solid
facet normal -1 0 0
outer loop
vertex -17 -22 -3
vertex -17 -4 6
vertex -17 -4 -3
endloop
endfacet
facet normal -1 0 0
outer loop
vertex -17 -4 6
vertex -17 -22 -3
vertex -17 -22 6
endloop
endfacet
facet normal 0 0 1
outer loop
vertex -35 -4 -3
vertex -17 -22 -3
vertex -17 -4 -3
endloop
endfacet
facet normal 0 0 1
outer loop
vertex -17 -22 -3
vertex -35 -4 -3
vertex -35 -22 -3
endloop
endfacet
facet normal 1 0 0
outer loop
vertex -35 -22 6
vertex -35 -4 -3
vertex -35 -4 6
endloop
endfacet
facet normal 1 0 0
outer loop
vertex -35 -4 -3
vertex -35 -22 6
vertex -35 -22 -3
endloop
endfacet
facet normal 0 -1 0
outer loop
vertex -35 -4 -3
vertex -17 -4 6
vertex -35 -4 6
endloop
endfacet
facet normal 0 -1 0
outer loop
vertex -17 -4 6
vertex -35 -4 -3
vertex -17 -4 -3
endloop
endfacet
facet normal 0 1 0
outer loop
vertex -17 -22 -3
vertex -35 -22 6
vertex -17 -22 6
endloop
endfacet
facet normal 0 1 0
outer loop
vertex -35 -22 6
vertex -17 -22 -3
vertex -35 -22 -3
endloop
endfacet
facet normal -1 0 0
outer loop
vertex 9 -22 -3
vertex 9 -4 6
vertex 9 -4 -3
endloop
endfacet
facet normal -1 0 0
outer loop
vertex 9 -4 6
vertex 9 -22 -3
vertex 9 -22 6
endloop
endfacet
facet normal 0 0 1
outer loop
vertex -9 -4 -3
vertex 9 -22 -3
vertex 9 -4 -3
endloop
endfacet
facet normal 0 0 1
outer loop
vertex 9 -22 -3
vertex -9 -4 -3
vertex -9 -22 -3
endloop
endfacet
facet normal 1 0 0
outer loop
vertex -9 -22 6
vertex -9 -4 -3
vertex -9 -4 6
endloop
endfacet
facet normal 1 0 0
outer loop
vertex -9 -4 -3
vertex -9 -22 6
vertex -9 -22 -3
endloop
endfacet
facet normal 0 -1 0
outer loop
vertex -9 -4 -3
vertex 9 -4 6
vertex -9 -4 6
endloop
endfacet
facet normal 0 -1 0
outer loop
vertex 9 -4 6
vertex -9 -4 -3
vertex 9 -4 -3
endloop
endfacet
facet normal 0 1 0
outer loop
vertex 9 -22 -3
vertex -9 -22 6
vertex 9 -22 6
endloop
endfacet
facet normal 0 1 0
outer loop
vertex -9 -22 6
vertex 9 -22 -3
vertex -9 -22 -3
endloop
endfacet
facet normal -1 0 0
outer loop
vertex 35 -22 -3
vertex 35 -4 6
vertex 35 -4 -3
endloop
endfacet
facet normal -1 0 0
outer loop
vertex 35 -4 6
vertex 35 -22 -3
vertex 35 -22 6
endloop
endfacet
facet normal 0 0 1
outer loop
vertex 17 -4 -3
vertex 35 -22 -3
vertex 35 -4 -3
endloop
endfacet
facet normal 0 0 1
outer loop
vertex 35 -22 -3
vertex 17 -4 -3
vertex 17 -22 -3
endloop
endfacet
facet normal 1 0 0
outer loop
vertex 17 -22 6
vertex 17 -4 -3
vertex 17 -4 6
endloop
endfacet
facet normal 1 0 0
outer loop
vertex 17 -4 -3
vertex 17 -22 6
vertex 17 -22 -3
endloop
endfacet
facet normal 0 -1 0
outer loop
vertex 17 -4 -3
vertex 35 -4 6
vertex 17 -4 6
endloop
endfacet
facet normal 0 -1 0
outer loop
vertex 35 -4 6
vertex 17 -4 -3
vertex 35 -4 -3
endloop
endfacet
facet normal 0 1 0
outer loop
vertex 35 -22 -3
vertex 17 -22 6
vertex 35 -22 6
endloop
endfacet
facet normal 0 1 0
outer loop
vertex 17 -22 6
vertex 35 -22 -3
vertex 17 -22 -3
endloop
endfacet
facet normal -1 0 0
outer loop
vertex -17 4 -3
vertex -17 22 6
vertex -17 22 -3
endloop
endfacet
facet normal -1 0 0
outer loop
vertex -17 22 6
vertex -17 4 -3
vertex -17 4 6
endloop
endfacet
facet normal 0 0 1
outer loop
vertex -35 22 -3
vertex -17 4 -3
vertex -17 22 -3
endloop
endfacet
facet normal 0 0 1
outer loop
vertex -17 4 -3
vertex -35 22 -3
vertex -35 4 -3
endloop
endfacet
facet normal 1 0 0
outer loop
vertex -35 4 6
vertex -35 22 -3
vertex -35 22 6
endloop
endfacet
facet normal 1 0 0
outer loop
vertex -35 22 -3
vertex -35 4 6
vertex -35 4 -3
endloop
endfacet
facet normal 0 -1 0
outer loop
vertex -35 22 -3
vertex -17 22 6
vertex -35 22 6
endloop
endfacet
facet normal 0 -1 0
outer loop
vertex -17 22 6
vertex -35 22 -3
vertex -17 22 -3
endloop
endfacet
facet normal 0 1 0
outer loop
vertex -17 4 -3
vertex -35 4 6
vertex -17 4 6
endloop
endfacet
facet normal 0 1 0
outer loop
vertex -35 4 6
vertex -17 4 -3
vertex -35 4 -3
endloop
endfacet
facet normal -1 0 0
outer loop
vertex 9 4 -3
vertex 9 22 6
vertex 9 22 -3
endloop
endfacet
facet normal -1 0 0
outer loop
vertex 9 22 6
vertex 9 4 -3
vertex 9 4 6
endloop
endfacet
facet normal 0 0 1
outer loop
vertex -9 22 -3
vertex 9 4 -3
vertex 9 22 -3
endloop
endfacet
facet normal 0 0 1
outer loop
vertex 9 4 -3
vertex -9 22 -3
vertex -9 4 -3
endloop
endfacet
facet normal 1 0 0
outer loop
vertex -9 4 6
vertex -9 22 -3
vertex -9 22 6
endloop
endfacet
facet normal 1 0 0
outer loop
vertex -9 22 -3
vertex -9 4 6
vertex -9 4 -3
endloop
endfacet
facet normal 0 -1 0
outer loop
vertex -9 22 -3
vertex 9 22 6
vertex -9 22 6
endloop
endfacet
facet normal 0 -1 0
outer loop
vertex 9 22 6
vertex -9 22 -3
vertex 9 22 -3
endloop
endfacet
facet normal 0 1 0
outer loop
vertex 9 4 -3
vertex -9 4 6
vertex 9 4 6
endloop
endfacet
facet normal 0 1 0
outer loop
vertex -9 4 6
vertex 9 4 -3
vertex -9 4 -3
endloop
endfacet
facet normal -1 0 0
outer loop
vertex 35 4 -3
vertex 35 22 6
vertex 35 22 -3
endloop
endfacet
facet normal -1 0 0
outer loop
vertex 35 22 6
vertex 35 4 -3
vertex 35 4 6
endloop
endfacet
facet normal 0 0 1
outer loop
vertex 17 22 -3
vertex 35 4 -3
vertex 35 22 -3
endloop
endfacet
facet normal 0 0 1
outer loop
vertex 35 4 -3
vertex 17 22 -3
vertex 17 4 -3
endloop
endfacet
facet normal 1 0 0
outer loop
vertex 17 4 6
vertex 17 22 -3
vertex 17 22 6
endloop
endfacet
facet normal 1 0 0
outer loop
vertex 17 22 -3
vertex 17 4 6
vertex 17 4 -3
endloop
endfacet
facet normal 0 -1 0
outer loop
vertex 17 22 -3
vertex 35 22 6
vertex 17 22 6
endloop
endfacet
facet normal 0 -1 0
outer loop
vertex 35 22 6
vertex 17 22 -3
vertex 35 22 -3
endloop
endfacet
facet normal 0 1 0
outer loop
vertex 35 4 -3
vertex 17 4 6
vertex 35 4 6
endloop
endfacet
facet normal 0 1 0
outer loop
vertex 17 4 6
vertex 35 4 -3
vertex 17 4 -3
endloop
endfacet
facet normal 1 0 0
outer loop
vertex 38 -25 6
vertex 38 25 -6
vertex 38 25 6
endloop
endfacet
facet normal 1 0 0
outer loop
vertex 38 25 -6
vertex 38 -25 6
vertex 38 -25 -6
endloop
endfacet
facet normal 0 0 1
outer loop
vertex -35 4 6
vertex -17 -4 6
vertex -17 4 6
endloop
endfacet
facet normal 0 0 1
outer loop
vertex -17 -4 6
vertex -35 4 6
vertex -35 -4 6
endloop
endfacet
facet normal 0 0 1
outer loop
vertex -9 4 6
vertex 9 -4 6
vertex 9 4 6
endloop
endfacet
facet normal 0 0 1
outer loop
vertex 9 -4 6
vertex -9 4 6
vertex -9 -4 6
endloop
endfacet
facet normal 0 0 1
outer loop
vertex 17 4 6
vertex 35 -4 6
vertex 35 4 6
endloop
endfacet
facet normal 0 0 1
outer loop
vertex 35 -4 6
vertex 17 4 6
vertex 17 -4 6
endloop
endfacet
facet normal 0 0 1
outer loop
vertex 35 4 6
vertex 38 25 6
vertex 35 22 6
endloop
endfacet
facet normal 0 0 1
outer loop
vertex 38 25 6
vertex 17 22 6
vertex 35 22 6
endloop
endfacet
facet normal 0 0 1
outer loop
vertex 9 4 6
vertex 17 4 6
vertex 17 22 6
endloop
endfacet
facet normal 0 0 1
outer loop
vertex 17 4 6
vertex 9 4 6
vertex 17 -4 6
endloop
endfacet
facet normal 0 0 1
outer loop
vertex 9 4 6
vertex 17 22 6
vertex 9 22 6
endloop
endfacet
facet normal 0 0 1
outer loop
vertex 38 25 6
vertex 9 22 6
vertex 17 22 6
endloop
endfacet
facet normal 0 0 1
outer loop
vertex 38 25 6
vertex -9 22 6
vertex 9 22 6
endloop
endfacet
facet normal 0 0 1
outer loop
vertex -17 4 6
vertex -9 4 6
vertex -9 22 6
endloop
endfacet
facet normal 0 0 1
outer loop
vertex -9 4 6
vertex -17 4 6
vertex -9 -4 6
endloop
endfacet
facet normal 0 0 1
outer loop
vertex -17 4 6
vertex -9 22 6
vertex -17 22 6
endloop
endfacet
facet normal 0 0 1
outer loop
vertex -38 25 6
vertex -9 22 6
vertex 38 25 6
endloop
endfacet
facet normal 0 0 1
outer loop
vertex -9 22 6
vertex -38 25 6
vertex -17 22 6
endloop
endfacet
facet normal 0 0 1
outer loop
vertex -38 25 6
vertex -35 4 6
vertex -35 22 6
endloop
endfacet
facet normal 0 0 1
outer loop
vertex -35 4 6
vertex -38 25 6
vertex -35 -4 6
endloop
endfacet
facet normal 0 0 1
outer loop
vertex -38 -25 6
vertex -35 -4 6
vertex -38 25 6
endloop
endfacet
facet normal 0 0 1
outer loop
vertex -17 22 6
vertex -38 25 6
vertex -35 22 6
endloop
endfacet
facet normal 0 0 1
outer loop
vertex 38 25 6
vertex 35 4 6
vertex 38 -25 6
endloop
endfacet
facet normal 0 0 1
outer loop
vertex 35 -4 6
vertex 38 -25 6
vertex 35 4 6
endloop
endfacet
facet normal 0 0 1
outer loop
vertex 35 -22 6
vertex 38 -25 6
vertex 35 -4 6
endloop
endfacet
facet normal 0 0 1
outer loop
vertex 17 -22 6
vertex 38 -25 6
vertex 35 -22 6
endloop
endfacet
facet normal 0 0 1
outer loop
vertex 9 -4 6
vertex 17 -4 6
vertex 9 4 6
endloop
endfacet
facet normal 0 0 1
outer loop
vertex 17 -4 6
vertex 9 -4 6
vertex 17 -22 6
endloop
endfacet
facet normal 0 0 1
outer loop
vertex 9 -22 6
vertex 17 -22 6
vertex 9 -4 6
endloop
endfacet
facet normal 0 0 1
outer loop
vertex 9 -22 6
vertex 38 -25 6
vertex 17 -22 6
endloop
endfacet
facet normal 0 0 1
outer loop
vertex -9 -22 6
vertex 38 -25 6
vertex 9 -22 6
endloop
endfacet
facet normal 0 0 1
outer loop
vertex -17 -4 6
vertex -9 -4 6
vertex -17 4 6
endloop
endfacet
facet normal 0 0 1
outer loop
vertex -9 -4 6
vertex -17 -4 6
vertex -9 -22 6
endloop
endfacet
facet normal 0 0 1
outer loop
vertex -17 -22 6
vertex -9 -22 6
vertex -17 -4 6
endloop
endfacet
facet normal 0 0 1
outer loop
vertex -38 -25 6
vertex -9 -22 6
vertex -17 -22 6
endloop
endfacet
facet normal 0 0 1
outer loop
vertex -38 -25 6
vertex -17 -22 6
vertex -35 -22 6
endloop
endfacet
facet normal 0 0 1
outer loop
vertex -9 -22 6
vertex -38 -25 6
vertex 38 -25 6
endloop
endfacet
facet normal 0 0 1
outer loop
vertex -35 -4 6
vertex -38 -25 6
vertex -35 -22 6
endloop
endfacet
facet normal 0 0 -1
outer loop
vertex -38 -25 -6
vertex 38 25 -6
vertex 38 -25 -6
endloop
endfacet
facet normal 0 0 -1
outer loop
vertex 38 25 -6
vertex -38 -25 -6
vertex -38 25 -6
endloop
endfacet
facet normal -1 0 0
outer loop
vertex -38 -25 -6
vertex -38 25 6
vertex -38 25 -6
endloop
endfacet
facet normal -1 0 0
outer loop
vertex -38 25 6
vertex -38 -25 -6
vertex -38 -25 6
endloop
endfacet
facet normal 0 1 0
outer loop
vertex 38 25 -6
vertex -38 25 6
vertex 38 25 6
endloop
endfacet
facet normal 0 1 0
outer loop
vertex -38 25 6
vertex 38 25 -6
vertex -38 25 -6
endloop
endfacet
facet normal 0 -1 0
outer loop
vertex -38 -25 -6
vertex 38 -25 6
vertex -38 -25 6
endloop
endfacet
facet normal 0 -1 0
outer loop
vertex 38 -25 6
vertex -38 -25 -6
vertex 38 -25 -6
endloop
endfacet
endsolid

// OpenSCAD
$fn = 32;

// ----------------------------------------------------------------------
// Pocket plate 76 x 50 x 12
// 2 x 3 pockets 18 mm square, 9 mm deep
// ----------------------------------------------------------------------

// --- parameters (mm) ---
thickness = 12;   // plate thickness
seat_tol = 0.15;  // tolerance at the seating features
free_tol = 0.5;   // general tolerance on the free sizes
floor_t = 3;      // material left under each pocket
pocket = 18;      // pocket side length
pitch_x = 26;     // pocket pitch along X
pitch_y = 26;     // pocket pitch along Y
cols = 3;         // pockets per row
rows = 2;         // rows of pockets

// --- derived feature positions (mm) ---
depth = thickness - floor_t;        // = 9   pocket depth, down to the floor
span_x = (cols - 1) * pitch_x;      // = 52   distance between outer pockets
span_y = (rows - 1) * pitch_y;      // = 26   distance between outer pocket rows
origin_x = -span_x / 2;             // = -26   X of the first pocket
origin_y = -span_y / 2;             // = -13   Y of the first pocket
plate = [span_x + pocket + 6, span_y + pocket + 6, thickness];  // = [76, 50, 12]   overall size: pockets plus 3 mm of wall on each side
feature_centers = [
  [origin_x + 0 * pitch_x, origin_y + 0 * pitch_y],
  [origin_x + 1 * pitch_x, origin_y + 0 * pitch_y],
  [origin_x + 2 * pitch_x, origin_y + 0 * pitch_y],
  [origin_x + 0 * pitch_x, origin_y + 1 * pitch_y],
  [origin_x + 1 * pitch_x, origin_y + 1 * pitch_y],
  [origin_x + 2 * pitch_x, origin_y + 1 * pitch_y]
];   // pocket centres, used verbatim by the cutter loop

// plate outline, then one pocket per centre in feature_centers
difference() {
  cube(plate, center = true);
  for (centre = feature_centers)
    translate([centre[0] - pocket / 2, centre[1] - pocket / 2, plate[2] / 2 - depth])
      cube([pocket, pocket, depth + 1]);  // centred on the declared pocket centre
}
